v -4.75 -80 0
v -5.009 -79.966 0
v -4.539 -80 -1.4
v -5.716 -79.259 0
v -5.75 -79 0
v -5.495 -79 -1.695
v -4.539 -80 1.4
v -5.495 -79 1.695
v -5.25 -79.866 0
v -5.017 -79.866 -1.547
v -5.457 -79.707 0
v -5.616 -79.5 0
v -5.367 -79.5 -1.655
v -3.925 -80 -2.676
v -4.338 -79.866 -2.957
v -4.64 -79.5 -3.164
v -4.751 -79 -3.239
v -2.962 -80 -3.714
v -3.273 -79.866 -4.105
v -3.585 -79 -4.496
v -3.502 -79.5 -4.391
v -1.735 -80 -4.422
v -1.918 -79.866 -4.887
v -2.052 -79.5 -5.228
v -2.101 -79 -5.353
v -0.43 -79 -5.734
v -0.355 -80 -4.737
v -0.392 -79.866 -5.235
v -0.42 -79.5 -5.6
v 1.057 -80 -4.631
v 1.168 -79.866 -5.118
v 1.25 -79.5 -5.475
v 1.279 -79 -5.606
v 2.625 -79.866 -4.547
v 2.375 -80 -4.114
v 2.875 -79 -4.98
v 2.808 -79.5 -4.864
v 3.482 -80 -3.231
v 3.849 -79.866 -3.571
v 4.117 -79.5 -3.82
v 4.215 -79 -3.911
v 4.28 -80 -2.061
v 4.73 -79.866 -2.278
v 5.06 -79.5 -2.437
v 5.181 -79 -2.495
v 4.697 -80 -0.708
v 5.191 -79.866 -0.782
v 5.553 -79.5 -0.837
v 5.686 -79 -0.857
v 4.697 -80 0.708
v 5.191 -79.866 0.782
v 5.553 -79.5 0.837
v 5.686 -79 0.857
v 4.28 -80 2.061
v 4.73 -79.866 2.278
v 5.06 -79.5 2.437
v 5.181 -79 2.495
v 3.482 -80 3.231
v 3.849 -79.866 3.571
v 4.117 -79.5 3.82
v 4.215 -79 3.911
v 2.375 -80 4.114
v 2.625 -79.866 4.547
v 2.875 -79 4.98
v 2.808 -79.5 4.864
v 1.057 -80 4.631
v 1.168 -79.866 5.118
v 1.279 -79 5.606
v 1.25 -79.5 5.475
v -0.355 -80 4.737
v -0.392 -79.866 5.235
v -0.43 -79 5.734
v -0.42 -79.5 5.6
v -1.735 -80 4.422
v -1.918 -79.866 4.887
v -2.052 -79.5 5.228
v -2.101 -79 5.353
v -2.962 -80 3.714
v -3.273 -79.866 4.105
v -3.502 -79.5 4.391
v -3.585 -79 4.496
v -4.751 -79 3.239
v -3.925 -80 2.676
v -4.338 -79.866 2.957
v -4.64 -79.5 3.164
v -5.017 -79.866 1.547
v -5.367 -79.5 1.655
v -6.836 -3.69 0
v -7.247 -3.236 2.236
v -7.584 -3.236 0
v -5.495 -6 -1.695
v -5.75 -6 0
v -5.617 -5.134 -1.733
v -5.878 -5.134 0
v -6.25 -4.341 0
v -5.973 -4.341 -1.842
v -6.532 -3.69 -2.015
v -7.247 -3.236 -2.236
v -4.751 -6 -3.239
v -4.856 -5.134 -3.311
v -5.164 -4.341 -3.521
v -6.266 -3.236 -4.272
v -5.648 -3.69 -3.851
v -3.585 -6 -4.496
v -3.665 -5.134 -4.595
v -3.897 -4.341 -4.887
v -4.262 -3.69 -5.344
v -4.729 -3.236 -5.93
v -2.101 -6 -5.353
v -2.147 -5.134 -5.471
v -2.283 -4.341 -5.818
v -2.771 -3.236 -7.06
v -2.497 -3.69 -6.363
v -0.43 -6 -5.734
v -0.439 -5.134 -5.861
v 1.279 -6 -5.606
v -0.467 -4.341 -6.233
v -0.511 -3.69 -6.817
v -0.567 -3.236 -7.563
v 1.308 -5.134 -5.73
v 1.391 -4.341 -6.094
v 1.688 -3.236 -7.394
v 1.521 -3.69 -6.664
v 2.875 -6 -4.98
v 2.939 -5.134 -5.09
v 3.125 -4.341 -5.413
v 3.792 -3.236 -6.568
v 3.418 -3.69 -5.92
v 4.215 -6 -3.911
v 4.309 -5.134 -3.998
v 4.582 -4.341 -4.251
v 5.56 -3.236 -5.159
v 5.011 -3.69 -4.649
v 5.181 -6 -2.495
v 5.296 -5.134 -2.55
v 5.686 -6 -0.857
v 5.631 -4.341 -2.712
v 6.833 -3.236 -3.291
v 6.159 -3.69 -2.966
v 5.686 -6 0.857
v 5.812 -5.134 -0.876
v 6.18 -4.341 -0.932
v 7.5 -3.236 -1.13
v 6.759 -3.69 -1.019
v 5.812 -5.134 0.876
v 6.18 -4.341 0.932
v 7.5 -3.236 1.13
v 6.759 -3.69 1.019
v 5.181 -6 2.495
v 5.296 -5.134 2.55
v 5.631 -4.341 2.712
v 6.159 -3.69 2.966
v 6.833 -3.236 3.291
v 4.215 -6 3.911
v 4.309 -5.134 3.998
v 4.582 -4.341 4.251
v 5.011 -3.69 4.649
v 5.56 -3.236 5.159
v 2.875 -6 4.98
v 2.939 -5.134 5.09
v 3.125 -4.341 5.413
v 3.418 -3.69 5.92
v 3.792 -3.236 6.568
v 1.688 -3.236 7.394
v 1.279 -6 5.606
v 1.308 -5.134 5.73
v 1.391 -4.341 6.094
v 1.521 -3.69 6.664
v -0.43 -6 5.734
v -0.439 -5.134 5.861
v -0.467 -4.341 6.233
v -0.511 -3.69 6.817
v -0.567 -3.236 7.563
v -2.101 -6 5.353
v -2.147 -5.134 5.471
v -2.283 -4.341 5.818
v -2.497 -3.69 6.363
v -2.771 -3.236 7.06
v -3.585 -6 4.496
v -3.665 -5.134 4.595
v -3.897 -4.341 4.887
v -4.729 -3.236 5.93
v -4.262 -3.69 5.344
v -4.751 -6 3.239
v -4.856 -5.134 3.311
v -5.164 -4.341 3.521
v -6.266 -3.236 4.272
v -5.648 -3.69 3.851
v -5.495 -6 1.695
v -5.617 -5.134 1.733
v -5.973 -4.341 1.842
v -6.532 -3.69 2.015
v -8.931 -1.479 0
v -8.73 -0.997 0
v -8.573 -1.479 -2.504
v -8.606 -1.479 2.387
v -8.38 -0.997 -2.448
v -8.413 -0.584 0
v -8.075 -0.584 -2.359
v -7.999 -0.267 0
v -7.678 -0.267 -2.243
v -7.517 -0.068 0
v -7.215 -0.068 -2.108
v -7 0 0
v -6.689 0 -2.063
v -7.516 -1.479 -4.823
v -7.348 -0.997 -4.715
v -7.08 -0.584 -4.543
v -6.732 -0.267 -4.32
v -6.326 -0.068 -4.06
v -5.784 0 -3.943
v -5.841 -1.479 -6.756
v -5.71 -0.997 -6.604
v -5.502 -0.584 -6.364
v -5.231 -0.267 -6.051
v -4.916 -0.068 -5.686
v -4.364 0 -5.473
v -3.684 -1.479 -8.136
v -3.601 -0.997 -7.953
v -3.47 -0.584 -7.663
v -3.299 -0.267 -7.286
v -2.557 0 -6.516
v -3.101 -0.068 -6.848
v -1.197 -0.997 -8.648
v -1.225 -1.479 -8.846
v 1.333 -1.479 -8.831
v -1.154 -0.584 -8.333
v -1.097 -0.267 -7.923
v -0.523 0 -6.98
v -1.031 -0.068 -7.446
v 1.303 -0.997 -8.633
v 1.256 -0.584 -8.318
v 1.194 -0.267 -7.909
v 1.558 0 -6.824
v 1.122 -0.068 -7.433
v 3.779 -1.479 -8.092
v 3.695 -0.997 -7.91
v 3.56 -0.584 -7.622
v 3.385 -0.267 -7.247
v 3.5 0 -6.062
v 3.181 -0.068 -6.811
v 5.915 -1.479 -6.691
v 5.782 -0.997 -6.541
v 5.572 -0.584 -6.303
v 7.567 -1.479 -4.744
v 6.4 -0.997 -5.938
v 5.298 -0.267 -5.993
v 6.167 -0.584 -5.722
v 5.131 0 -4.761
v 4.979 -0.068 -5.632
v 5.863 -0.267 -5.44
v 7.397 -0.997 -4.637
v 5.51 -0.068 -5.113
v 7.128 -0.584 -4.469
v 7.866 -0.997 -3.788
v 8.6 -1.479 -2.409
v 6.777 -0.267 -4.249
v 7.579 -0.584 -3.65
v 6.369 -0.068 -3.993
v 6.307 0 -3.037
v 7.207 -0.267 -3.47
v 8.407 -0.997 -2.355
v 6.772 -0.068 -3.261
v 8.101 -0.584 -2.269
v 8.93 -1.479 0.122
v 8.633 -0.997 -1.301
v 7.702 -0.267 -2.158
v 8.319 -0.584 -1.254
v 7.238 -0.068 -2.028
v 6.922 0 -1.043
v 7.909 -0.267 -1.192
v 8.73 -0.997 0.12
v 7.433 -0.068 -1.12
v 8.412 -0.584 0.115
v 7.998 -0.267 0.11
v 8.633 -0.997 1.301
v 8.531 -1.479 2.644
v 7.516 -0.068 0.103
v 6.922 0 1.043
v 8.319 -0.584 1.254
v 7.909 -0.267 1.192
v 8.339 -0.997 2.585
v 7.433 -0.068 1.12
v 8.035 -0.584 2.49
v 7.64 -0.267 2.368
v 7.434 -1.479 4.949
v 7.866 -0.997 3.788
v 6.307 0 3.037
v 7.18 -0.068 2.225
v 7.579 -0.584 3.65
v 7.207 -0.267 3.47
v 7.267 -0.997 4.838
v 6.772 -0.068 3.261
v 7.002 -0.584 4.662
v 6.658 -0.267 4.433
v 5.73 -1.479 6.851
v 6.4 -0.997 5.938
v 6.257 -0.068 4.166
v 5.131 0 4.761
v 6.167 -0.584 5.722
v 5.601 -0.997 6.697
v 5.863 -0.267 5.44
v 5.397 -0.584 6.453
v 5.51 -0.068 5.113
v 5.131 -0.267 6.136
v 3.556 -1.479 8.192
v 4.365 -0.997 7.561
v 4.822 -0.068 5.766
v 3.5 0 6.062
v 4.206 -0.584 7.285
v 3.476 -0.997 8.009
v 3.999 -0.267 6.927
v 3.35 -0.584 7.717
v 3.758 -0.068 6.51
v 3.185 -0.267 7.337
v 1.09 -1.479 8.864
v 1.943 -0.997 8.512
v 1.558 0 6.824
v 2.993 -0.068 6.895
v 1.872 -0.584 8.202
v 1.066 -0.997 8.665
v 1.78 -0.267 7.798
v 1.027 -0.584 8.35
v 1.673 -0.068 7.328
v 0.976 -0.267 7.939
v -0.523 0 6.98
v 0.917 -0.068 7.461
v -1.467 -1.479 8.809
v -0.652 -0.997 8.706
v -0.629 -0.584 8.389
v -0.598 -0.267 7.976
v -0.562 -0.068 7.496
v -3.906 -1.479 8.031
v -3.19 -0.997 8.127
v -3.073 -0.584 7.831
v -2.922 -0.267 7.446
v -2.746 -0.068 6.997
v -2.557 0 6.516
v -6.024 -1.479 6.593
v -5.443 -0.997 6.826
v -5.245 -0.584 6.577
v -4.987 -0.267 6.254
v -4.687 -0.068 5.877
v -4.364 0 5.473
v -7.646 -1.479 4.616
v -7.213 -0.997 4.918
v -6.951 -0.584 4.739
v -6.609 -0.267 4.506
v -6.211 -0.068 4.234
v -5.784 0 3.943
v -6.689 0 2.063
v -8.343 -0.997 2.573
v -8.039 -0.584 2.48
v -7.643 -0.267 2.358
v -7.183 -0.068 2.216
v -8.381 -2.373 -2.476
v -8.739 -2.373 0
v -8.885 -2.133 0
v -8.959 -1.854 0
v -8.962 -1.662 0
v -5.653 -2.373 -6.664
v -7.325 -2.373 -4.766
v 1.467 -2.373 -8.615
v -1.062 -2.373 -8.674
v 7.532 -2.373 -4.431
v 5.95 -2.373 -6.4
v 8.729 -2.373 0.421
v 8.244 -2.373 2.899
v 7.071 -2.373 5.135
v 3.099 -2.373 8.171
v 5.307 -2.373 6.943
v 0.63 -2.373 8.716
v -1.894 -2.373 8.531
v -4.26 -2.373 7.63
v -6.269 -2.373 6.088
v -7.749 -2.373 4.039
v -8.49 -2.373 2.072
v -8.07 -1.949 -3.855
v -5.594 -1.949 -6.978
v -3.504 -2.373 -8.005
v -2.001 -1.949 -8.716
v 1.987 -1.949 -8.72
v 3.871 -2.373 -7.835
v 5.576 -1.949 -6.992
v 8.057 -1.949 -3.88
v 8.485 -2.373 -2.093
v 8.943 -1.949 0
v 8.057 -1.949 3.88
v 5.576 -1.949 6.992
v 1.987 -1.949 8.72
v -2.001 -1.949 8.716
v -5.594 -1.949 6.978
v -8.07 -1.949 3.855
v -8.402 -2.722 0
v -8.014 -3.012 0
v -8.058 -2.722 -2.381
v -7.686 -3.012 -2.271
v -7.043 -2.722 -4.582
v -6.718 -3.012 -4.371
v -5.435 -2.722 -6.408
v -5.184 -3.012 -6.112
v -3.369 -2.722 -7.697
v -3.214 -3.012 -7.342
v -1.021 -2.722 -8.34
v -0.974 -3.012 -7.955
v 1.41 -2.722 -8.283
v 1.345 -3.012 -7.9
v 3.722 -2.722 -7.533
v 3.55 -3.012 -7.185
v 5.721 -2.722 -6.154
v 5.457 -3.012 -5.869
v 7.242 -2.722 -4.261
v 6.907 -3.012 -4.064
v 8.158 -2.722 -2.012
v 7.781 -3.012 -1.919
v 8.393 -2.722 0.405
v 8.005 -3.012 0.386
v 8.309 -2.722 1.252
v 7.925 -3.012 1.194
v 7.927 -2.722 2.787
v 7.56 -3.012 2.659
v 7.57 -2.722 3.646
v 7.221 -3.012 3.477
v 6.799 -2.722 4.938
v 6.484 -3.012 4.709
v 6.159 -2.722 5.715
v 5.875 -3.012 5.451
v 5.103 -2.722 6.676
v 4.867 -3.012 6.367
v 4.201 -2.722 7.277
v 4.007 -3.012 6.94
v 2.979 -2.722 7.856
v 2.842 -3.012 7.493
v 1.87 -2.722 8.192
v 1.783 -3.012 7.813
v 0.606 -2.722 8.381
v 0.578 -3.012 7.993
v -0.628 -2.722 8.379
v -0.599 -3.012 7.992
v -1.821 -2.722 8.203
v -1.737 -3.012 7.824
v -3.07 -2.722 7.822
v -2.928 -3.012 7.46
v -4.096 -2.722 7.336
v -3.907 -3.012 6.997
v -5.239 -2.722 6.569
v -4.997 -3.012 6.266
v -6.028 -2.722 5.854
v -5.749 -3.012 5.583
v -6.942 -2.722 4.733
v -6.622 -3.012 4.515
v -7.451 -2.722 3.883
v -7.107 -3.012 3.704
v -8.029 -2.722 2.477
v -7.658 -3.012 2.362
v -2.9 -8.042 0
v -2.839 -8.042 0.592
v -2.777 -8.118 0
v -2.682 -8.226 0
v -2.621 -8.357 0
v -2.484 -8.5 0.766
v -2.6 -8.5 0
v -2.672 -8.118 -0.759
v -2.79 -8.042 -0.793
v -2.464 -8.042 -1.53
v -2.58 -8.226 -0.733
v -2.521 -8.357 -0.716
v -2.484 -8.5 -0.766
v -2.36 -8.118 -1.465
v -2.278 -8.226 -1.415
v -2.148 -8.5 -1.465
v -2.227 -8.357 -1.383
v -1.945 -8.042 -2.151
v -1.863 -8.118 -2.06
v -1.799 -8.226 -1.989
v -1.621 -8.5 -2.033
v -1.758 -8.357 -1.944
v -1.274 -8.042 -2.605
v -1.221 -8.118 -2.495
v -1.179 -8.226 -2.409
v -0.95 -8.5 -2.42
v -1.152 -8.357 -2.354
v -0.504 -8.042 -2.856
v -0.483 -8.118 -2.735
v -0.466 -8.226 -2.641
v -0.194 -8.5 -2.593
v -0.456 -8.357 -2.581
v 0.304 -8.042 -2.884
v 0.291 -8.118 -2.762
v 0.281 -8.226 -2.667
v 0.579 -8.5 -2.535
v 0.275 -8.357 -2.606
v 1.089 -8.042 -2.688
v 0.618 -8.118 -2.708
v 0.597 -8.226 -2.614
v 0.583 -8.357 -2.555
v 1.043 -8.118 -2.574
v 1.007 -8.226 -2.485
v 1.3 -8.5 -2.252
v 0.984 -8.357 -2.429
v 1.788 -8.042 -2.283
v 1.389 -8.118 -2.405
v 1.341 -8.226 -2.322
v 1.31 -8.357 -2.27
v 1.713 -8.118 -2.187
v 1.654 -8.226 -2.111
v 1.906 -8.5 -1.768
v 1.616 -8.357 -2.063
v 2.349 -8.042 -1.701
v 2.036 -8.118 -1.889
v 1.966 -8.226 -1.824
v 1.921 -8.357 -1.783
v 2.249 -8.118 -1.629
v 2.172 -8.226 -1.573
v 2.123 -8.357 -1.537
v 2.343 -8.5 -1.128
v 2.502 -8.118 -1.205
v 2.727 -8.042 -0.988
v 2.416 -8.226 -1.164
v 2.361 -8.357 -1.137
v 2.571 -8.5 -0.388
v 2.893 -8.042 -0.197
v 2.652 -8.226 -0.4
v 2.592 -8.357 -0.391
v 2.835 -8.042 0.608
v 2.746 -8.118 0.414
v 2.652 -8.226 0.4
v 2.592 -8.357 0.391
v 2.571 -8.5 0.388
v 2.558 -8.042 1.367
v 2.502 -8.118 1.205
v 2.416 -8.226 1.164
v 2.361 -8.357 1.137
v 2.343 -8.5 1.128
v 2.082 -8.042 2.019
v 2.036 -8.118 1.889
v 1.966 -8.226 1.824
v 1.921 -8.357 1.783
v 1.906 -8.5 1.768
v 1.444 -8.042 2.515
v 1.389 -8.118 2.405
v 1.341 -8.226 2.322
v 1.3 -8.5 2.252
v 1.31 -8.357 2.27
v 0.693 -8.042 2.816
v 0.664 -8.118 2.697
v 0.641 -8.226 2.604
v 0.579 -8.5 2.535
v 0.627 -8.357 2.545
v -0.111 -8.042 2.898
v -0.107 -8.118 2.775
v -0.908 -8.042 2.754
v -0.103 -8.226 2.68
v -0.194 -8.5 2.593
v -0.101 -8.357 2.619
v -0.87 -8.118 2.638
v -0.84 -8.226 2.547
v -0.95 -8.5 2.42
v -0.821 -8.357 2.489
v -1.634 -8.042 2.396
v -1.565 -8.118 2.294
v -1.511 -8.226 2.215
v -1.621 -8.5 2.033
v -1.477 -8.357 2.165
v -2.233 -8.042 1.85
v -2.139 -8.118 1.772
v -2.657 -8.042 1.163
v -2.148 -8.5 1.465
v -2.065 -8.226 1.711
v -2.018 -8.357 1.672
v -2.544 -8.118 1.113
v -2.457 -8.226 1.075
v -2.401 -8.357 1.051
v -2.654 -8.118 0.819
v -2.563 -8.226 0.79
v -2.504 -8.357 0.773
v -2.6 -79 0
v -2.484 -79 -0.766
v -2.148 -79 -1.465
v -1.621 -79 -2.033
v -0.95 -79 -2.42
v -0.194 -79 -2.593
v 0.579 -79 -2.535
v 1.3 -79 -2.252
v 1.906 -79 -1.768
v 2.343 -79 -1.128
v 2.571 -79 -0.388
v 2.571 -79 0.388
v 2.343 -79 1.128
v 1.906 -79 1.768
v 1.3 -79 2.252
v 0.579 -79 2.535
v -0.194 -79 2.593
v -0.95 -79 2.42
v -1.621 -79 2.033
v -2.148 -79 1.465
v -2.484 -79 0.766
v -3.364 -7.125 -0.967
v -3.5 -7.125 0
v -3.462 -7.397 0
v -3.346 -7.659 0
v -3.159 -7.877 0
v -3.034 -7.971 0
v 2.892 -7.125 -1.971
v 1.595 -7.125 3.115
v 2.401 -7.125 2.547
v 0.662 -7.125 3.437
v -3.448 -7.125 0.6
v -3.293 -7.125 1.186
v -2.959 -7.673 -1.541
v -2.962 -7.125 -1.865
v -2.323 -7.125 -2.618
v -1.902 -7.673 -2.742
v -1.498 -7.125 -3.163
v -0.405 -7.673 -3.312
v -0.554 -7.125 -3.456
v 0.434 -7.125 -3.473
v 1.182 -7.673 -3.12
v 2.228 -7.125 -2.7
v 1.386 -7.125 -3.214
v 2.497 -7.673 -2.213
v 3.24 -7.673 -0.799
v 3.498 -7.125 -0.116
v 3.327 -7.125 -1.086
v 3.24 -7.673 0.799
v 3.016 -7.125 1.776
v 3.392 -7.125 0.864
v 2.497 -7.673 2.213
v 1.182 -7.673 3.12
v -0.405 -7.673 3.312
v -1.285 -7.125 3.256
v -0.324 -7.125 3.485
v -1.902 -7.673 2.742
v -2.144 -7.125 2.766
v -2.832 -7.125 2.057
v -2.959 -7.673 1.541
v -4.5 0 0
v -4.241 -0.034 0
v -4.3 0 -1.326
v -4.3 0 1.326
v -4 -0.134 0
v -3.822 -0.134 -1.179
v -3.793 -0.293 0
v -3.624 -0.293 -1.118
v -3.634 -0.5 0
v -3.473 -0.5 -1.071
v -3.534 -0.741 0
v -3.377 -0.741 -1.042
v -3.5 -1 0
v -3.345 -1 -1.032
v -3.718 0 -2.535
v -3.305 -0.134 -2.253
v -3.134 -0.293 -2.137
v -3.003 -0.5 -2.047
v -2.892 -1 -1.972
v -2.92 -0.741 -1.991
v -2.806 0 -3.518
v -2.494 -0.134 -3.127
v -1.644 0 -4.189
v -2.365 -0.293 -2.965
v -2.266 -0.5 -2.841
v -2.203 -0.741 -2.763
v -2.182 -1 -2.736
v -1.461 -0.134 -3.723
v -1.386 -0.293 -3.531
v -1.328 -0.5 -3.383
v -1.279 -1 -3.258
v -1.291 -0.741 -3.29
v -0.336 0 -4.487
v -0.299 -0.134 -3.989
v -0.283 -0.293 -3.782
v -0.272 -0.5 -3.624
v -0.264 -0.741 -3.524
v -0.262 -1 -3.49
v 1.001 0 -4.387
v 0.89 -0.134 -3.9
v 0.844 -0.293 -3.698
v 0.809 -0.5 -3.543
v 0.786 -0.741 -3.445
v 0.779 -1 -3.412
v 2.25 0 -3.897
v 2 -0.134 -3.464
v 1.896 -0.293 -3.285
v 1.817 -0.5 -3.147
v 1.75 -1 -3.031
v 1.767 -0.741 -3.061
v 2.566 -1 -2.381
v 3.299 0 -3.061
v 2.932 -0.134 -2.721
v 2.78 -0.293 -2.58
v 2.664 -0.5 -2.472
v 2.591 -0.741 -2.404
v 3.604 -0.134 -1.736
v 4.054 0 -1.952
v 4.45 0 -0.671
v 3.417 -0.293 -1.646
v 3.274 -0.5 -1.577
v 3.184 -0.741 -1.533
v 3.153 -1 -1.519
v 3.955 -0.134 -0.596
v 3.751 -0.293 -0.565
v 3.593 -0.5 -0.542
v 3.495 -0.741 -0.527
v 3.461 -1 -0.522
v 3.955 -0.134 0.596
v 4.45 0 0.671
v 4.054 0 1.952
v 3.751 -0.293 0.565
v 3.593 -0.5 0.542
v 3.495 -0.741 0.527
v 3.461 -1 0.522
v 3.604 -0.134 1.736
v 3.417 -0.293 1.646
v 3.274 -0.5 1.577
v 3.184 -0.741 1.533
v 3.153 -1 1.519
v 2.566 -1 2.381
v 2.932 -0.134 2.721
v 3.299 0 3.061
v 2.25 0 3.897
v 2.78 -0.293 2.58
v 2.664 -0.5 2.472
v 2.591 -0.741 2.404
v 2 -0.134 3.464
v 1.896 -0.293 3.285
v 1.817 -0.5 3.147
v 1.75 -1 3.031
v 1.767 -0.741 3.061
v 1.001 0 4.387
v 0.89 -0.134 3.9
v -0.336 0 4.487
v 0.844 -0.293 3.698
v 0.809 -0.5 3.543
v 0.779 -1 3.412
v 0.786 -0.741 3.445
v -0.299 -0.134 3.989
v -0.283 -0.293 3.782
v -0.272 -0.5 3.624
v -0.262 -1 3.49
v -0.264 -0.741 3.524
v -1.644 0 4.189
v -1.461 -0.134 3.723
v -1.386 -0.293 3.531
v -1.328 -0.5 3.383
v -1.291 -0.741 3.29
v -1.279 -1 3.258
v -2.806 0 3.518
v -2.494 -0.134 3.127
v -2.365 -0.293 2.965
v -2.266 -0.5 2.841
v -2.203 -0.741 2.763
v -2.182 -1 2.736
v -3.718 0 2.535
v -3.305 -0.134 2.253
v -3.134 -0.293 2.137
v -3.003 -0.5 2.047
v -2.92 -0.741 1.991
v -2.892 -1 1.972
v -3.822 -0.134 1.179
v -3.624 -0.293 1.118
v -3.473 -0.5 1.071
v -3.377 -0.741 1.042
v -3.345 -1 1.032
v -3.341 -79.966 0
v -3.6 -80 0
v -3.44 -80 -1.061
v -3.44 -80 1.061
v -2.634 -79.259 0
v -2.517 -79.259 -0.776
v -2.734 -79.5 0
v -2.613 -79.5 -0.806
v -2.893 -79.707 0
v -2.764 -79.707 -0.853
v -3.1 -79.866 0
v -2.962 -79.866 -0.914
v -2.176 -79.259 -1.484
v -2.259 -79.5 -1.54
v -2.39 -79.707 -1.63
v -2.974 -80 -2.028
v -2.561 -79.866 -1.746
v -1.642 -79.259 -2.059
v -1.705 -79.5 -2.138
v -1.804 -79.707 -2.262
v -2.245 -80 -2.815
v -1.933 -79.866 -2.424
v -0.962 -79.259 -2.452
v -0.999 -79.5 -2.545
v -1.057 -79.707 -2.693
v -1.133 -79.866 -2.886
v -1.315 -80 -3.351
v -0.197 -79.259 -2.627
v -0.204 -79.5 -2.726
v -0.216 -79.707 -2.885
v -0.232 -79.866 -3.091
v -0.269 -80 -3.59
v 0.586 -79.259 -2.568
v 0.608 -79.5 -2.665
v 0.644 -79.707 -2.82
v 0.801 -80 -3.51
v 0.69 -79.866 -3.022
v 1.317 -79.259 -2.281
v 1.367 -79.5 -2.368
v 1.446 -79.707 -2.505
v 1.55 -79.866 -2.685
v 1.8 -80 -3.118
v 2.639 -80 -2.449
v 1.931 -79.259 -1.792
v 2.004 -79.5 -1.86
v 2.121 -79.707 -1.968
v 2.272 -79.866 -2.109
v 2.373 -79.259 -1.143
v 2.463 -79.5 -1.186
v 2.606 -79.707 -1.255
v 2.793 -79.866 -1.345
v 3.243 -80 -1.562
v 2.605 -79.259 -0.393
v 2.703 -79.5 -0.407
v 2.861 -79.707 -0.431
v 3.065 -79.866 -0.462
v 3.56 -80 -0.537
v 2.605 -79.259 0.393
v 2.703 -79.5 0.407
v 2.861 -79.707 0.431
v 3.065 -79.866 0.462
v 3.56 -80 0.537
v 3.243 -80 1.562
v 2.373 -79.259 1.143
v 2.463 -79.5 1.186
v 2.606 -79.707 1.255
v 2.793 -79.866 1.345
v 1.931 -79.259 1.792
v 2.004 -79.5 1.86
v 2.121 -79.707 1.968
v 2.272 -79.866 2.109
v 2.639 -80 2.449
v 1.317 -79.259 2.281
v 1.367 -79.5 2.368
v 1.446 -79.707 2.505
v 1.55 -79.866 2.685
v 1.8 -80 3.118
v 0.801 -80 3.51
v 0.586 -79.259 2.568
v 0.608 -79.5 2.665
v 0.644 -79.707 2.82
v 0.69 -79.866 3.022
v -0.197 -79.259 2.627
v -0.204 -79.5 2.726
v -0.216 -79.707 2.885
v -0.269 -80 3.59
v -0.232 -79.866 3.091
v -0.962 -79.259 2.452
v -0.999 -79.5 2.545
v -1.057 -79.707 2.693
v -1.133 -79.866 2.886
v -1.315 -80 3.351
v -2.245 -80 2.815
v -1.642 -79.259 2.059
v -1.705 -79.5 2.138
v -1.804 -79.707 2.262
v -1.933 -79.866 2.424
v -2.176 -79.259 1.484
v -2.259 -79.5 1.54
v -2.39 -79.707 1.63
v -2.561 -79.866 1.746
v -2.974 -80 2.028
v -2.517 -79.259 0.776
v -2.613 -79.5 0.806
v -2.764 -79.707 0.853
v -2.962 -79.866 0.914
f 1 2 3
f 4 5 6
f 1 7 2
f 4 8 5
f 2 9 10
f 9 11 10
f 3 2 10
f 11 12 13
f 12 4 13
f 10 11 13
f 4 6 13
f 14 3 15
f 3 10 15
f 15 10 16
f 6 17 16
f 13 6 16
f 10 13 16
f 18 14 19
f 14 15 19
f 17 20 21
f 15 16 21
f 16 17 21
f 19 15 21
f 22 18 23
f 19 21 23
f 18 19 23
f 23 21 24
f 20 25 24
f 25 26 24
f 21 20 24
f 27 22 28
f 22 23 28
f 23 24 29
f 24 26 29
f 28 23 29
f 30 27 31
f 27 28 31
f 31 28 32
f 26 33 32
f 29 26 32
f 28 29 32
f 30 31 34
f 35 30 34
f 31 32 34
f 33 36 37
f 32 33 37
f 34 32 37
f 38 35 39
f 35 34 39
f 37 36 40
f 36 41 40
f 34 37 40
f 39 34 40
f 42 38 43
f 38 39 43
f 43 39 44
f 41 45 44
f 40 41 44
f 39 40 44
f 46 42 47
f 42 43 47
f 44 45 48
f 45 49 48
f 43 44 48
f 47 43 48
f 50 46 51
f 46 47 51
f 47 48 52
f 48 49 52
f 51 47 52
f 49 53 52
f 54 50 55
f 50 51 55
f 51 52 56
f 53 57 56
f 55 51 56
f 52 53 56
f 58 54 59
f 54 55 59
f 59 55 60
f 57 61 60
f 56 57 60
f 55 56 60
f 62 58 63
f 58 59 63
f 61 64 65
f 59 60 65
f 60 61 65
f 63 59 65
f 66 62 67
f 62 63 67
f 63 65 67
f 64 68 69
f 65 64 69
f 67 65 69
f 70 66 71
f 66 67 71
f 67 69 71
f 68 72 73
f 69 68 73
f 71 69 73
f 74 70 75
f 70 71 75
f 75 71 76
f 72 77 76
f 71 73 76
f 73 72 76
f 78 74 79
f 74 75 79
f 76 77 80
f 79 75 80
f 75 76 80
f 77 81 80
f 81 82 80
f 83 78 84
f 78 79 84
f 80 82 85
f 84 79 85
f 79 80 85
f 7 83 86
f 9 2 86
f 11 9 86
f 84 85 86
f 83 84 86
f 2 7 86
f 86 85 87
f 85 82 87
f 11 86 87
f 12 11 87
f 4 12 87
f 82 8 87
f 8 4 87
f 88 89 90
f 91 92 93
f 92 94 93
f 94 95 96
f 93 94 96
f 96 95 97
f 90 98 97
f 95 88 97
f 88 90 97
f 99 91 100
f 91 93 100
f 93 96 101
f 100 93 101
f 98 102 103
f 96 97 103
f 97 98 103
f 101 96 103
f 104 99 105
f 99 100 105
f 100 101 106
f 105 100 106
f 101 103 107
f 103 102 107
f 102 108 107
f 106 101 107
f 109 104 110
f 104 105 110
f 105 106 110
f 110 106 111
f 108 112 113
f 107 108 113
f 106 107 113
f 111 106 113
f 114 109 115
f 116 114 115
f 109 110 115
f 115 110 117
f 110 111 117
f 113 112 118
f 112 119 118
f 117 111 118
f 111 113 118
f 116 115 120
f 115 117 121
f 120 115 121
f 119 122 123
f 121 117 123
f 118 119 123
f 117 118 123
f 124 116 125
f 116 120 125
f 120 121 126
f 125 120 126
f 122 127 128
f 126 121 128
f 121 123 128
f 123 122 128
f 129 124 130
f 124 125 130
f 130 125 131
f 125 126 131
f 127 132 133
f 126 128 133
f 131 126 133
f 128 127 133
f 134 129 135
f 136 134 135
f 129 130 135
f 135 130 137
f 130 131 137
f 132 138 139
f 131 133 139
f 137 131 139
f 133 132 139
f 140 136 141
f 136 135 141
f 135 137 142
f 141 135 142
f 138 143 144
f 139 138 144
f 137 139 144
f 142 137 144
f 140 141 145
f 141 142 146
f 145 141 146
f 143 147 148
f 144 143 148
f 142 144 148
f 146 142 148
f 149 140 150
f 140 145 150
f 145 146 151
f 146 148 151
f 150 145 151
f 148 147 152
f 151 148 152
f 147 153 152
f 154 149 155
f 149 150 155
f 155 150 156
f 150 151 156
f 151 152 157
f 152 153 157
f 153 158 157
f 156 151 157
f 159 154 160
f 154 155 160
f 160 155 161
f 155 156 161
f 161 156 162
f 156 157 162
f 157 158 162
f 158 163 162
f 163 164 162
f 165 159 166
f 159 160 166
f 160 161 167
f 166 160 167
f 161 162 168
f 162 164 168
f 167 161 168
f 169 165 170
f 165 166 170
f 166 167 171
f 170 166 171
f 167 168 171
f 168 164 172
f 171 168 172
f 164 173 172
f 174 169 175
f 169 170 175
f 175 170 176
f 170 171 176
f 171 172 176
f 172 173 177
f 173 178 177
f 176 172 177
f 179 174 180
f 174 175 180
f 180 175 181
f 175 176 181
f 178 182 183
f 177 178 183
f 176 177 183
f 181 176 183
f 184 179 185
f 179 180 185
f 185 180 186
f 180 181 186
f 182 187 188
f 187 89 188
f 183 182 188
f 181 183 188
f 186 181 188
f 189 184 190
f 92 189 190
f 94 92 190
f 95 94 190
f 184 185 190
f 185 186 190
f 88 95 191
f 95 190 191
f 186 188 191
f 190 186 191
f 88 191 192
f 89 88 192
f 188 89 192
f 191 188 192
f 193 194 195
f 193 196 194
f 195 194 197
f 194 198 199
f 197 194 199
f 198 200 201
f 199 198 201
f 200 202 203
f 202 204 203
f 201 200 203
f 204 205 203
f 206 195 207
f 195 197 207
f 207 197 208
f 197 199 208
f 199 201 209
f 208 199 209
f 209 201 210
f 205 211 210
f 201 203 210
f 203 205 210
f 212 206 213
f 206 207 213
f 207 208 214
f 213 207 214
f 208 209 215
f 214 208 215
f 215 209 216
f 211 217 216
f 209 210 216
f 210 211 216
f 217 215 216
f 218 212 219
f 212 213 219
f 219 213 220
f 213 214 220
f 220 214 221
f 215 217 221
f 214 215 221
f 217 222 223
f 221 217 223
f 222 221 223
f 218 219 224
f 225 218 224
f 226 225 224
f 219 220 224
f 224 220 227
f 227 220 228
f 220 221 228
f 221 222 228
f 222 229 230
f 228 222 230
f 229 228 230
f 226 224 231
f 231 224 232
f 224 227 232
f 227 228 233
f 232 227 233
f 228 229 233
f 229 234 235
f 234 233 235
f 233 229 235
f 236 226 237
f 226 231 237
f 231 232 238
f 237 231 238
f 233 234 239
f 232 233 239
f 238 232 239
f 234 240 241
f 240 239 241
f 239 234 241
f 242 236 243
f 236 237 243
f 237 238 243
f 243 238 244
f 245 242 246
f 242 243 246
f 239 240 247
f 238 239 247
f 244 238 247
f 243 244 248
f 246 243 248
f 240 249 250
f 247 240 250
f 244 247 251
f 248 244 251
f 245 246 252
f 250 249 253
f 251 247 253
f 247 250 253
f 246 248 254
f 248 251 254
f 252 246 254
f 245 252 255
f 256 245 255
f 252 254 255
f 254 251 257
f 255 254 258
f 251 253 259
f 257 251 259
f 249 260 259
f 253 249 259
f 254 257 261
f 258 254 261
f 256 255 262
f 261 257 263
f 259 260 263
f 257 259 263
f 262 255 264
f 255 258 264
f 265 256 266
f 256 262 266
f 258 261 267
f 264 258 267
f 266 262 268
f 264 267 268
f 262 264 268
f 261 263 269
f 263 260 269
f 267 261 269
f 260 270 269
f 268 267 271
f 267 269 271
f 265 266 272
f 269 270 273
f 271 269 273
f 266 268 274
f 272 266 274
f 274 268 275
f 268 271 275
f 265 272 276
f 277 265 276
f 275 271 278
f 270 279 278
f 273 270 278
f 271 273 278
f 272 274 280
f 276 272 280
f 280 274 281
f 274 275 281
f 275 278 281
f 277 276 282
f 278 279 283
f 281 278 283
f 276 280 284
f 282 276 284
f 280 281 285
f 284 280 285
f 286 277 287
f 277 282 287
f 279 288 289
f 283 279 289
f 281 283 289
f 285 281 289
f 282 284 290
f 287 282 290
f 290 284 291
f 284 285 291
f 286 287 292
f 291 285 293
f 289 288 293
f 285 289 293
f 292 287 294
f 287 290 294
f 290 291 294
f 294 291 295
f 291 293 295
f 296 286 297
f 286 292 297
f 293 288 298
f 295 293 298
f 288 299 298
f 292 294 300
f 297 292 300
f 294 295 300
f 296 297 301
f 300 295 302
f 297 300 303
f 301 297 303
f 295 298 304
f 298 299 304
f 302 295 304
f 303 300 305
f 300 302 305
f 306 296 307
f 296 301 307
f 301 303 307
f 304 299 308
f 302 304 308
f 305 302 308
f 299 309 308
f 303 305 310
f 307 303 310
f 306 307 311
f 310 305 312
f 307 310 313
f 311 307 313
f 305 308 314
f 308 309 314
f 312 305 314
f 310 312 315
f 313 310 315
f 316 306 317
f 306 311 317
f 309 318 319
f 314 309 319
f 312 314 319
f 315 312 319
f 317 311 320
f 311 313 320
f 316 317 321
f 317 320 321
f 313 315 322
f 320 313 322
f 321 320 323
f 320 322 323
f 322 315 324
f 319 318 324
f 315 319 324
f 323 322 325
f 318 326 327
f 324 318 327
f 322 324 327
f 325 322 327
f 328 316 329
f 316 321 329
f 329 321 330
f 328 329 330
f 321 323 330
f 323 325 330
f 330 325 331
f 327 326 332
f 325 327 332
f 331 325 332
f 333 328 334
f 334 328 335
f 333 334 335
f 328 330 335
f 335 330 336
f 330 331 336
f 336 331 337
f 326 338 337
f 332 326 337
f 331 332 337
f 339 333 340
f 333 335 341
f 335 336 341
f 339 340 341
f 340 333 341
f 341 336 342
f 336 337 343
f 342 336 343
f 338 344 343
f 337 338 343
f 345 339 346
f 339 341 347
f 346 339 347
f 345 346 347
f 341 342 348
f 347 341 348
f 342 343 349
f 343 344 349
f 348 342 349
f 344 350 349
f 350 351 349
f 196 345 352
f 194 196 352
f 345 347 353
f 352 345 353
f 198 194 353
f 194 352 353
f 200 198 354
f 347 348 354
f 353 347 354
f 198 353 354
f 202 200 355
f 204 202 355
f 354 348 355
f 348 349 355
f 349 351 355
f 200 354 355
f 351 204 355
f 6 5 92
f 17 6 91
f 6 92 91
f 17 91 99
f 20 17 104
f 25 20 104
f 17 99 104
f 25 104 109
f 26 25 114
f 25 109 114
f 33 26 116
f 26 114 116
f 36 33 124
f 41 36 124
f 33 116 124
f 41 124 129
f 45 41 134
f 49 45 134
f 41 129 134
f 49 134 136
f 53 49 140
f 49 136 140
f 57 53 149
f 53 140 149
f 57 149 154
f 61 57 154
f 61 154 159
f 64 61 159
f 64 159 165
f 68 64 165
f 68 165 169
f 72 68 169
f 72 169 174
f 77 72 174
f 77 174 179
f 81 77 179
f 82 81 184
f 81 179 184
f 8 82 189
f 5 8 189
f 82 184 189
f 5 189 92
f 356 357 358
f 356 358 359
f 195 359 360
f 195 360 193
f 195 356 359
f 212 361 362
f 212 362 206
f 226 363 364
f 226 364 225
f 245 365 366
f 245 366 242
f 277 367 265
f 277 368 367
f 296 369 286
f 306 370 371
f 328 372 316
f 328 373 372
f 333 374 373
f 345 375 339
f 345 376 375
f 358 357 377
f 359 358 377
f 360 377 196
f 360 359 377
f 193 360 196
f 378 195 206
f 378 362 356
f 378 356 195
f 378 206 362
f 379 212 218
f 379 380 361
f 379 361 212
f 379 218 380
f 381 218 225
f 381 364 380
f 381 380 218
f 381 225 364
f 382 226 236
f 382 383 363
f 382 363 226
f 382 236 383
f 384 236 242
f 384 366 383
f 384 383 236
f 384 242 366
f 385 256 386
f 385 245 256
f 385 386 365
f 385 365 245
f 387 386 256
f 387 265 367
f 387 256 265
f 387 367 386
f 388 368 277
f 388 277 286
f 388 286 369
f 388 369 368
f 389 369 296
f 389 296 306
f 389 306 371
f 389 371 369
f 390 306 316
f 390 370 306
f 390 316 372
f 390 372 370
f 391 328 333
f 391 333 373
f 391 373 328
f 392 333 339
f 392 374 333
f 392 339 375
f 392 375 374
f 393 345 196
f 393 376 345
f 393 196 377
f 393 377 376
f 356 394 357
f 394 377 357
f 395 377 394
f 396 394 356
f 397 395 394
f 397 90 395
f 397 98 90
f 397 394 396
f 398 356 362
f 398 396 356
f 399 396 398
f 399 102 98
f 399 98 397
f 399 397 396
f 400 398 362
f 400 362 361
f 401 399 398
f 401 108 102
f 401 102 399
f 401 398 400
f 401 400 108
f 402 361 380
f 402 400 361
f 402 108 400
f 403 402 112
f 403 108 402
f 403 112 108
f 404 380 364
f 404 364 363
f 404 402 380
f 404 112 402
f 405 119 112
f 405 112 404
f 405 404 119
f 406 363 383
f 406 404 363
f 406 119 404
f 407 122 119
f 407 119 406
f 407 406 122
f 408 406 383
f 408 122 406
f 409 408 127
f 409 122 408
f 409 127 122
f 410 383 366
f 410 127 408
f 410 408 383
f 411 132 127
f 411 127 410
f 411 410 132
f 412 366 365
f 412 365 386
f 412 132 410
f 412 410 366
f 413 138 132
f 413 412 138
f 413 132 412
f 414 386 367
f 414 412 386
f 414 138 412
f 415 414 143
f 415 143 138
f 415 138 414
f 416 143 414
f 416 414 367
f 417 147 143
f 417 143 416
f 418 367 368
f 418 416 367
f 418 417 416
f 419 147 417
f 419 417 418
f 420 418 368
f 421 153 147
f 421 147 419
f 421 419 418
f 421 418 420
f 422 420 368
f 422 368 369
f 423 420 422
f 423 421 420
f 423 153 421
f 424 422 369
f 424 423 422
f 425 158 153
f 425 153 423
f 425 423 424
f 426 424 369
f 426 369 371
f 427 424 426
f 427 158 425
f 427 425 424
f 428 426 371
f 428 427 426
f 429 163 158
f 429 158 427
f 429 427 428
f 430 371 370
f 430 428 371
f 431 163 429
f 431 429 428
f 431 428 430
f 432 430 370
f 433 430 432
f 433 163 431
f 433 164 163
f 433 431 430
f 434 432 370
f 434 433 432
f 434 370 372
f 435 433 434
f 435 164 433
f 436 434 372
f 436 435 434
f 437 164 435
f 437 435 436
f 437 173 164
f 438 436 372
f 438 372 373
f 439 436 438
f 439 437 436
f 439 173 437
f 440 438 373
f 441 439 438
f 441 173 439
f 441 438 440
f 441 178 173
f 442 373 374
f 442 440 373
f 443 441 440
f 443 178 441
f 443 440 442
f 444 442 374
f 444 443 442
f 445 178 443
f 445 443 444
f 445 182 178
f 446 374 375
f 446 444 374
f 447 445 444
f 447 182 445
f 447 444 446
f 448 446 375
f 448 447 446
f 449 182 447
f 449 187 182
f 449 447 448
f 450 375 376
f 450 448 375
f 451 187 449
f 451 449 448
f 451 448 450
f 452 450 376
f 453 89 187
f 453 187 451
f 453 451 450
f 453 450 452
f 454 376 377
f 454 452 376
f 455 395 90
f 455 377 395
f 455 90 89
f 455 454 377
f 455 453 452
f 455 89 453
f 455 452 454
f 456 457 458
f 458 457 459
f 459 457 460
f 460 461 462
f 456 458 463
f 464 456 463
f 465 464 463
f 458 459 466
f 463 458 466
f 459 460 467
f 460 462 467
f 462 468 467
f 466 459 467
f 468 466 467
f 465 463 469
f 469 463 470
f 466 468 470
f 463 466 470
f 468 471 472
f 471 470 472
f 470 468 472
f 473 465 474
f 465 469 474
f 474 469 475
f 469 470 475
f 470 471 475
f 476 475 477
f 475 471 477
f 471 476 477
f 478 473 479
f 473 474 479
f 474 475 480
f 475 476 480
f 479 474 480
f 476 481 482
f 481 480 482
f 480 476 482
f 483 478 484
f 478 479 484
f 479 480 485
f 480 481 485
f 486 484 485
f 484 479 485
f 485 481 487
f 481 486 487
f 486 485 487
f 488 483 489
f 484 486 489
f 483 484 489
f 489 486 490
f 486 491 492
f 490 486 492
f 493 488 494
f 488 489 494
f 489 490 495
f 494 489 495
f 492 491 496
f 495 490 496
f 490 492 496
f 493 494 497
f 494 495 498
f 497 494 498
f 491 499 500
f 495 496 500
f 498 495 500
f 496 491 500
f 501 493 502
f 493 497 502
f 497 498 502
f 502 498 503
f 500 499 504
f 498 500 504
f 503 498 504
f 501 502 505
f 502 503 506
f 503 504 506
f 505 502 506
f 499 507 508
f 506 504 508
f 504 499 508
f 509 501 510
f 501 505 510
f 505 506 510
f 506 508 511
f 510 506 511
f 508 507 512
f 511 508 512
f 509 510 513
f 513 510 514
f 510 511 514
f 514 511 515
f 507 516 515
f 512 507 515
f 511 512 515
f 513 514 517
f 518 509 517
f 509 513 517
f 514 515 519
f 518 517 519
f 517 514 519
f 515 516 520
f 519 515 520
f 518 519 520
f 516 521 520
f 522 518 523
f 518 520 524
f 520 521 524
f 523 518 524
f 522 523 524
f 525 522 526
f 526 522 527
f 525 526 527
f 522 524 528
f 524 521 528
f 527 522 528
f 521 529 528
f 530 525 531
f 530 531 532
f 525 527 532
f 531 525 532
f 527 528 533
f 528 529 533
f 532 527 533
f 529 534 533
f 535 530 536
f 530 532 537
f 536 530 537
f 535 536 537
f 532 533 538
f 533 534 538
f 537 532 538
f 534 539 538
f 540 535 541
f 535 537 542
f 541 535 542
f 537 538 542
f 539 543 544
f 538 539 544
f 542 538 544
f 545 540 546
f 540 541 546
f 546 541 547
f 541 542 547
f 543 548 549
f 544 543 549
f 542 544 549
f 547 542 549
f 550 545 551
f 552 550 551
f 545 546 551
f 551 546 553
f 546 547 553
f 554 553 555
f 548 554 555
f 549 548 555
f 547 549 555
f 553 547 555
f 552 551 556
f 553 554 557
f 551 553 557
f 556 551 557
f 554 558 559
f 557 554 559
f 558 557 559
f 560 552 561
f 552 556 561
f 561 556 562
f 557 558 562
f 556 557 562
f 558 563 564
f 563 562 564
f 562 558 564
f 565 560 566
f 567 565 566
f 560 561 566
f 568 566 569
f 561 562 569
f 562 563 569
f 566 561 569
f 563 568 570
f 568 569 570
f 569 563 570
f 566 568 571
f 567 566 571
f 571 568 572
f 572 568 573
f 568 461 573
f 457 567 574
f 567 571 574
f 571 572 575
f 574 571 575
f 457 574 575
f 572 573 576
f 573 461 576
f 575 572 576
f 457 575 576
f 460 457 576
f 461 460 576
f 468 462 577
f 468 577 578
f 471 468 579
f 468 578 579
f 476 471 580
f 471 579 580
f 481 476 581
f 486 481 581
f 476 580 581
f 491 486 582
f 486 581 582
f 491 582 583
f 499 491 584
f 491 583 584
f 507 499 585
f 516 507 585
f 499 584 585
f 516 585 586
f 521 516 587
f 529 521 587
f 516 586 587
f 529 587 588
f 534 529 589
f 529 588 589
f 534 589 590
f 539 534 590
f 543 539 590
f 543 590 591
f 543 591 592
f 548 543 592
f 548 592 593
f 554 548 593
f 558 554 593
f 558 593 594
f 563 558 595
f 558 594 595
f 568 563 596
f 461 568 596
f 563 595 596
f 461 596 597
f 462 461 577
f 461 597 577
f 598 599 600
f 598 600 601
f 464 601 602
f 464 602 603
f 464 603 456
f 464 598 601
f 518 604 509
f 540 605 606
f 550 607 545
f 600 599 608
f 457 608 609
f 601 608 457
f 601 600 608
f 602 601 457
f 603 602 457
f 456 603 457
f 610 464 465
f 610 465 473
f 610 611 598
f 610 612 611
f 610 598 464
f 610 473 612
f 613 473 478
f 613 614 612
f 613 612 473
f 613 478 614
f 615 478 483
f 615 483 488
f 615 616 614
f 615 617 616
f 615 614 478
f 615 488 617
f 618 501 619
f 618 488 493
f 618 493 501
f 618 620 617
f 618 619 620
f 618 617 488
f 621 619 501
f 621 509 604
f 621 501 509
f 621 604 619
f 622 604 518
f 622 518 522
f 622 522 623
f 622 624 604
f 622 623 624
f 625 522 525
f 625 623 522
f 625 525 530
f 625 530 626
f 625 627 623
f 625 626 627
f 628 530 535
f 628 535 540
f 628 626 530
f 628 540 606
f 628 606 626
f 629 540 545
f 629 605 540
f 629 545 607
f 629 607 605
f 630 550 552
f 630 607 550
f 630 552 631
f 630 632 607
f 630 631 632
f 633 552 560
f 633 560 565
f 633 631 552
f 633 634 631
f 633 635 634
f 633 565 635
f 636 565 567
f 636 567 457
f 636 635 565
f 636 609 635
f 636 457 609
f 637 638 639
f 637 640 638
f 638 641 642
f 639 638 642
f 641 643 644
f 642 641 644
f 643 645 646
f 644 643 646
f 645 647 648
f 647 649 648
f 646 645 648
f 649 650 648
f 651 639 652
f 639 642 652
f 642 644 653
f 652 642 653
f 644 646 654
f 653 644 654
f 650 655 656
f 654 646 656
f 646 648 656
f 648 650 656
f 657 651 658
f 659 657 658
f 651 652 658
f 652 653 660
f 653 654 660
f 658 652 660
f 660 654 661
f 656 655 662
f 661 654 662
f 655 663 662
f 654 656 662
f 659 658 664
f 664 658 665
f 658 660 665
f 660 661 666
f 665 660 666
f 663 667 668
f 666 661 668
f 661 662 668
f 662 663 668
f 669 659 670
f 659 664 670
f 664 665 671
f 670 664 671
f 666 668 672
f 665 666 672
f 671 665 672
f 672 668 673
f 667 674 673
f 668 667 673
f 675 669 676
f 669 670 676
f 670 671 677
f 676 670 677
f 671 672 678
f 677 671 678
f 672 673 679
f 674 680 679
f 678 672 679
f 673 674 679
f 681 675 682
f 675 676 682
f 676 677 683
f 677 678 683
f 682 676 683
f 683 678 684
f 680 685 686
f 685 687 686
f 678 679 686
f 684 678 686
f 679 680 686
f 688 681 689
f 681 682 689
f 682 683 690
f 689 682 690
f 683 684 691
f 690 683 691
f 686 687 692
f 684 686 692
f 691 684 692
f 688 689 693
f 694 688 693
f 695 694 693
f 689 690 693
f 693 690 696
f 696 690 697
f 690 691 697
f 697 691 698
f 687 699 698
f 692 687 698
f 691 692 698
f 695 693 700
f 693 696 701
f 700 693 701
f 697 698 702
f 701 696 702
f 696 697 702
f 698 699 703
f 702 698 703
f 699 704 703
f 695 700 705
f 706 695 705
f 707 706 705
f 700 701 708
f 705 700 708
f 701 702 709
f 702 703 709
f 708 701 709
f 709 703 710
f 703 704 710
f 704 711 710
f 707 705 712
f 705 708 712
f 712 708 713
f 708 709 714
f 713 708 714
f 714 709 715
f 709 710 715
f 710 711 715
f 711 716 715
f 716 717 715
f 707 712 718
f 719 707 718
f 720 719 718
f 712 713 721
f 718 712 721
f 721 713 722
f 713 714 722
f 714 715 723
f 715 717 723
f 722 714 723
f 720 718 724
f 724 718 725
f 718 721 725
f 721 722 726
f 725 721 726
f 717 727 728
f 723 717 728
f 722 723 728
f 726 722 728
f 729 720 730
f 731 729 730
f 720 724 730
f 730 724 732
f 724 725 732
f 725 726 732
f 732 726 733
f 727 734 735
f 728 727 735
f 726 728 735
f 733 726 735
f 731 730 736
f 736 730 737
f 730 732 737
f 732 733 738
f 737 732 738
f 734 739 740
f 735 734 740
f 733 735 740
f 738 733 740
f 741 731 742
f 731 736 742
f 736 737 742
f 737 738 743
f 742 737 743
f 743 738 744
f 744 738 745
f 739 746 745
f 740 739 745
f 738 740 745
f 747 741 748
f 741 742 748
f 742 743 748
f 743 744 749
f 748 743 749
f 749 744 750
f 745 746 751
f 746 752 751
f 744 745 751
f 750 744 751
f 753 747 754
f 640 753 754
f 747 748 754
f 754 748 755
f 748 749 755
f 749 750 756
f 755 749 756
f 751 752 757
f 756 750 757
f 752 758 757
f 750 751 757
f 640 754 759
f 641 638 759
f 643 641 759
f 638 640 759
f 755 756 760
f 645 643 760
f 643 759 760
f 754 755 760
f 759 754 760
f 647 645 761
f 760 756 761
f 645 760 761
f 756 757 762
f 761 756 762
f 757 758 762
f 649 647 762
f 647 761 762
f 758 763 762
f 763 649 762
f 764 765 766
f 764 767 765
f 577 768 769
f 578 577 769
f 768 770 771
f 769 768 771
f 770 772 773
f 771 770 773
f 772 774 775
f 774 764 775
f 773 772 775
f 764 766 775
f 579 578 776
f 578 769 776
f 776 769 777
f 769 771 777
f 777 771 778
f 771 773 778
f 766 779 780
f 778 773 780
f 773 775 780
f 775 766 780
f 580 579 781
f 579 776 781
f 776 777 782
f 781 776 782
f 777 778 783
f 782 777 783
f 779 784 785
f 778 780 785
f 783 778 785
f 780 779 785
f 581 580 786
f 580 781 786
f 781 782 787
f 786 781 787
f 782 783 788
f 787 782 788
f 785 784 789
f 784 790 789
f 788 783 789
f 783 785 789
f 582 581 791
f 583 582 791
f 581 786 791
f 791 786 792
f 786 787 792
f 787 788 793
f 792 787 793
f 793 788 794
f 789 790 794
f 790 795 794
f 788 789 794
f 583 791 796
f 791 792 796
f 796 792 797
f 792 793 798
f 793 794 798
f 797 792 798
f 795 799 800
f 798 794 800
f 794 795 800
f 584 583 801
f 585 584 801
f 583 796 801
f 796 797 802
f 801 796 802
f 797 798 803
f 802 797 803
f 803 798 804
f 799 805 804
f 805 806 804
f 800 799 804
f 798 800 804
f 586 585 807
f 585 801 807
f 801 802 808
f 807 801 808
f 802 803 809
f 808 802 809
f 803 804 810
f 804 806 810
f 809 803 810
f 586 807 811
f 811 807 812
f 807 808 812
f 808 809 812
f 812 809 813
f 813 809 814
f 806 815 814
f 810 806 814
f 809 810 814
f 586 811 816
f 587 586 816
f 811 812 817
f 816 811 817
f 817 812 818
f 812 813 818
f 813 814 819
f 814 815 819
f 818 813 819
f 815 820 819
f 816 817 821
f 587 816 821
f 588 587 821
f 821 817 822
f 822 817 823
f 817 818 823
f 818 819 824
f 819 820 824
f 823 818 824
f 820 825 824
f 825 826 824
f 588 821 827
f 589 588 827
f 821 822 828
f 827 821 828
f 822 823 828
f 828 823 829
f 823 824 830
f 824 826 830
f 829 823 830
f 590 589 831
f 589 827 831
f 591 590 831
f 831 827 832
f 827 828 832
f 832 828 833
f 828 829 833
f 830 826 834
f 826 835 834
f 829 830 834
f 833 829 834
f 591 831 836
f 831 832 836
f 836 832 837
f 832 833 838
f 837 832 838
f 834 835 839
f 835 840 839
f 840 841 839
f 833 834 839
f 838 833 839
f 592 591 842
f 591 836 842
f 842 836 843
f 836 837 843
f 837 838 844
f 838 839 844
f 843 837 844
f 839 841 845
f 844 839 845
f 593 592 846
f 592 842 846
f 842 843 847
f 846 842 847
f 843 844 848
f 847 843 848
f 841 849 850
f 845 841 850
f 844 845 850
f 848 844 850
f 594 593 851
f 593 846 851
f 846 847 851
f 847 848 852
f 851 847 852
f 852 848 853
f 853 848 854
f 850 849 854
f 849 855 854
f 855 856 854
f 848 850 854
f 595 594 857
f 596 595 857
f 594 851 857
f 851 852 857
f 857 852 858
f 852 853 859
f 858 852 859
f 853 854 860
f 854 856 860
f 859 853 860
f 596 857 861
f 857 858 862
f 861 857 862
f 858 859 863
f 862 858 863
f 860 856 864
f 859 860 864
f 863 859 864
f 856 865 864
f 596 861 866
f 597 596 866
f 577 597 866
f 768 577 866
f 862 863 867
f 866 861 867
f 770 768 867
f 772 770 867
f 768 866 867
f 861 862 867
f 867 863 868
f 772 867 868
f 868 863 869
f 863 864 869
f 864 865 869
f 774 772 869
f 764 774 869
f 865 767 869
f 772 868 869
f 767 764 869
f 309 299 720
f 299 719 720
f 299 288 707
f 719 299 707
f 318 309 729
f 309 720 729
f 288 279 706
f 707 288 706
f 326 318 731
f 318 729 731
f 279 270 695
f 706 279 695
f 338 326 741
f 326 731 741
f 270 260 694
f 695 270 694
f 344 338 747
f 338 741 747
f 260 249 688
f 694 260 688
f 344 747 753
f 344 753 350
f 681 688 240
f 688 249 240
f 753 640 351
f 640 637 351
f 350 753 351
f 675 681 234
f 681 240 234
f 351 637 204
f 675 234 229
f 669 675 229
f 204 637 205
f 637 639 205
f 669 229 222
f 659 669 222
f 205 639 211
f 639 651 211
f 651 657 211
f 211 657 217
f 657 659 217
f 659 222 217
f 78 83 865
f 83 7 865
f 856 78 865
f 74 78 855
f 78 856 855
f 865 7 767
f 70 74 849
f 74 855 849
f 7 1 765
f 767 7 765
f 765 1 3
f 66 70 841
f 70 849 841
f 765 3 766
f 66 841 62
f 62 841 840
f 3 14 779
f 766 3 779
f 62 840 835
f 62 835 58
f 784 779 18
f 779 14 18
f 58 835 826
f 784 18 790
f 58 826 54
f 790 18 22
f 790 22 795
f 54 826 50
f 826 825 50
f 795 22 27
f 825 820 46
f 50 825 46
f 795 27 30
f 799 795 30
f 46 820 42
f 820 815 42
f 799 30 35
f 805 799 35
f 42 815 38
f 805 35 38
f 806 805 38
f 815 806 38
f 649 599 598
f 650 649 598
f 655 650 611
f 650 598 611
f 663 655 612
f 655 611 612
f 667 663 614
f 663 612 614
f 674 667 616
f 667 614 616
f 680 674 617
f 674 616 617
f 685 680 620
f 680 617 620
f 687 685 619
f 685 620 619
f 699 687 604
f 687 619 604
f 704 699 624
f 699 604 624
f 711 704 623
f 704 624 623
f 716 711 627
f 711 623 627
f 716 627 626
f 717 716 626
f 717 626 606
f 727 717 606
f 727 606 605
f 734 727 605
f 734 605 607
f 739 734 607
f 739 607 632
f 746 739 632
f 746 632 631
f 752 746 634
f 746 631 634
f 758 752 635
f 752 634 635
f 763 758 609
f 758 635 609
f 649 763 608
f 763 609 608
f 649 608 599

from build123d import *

# Parameters (mm, degrees)
FILLET1_R  = 3
FILLET3_R  = 2
FILLET4_R  = 1
FILLET7_R  = 0.5
FILLET9_R  = 1
FILLET10_R = 1
FILLET11_R = 3
FILLET12_R = 1
FILLET13_R = 1


with BuildPart() as part:
    # Sketch1 → Revolve1 (revolve)
    with BuildSketch(Plane.XY, mode=Mode.PRIVATE) as revolve1_sk:
        Polygon((9, 0), (3.5, 0), (3.5, -8), (2.6, -8), (2.6, -80), (5.75, -80), (5.75, -3), (9, -3), align=None)
    revolve(revolve1_sk.sketch.rotate(Axis((0, 0, 0), (0, -1, 0)), 180), axis=Axis((0, 0, 0), (0, -1, 0)))

    # Fillet1
    fillet1_edges = [part.edges().sort_by_distance(p)[0] for p in [
        (5.75, -3, 0),
    ]]
    fillet(fillet1_edges, radius=FILLET1_R)

    # Fillet3
    fillet3_edges = [part.edges().sort_by_distance(p)[0] for p in [
        (9, 0, 0),
    ]]
    fillet(fillet3_edges, radius=FILLET3_R)

    # Fillet4
    fillet4_edges = [part.edges().sort_by_distance(p)[0] for p in [
        (3.5, 0, 0),
    ]]
    fillet(fillet4_edges, radius=FILLET4_R)

    # Fillet7
    fillet7_edges = [part.edges().sort_by_distance(p)[0] for p in [
        (2.6, -8, 0),
    ]]
    fillet(fillet7_edges, radius=FILLET7_R)

    # Fillet9
    fillet9_edges = [part.edges().sort_by_distance(p)[0] for p in [
        (2.6, -80, 0),
    ]]
    fillet(fillet9_edges, radius=FILLET9_R)

    # Fillet10
    fillet10_edges = [part.edges().sort_by_distance(p)[0] for p in [
        (5.75, -80, 0),
    ]]
    fillet(fillet10_edges, radius=FILLET10_R)

    # Fillet11
    # the kernel refuses this fillet: 3 mm, written as the material it takes off along each edge
    with BuildSketch(Plane(origin=(0, -3, 0), x_dir=(-1, 0, 0), z_dir=(0, 0, 1))) as fillet11_piece_1:
        with BuildLine():
            CenterArc((6.418602734, -2.528524829), FILLET11_R, 30.631081829, 36.503603927)
            Line((9, -1), (9.258139727, -0.847147517))
            ThreePointArc((9.258139727, -0.847147517), (9.3, -0.5), (9.3, 0))
            Line((9.3, 0), (9, 0.3))
            ThreePointArc((9, 0.3), (8.75, 0.3), (7.70087123, 0.512163827))
            Line((7.70087123, 0.512163827), (7.584301367, 0.235737585))
        make_face()
    revolve(axis=Axis((0, -3, 0), (0, -1, 0)), mode=Mode.SUBTRACT)

    # Fillet12
    fillet12_edges = [part.edges().sort_by_distance(p)[0] for p in [
        (9, -2, 0),
    ]]
    fillet(fillet12_edges, radius=FILLET12_R)

    # Fillet13
    fillet13_edges = [part.edges().sort_by_distance(p)[0] for p in [
        (3.5, -8, 0),
    ]]
    fillet(fillet13_edges, radius=FILLET13_R)


solid = part.part
